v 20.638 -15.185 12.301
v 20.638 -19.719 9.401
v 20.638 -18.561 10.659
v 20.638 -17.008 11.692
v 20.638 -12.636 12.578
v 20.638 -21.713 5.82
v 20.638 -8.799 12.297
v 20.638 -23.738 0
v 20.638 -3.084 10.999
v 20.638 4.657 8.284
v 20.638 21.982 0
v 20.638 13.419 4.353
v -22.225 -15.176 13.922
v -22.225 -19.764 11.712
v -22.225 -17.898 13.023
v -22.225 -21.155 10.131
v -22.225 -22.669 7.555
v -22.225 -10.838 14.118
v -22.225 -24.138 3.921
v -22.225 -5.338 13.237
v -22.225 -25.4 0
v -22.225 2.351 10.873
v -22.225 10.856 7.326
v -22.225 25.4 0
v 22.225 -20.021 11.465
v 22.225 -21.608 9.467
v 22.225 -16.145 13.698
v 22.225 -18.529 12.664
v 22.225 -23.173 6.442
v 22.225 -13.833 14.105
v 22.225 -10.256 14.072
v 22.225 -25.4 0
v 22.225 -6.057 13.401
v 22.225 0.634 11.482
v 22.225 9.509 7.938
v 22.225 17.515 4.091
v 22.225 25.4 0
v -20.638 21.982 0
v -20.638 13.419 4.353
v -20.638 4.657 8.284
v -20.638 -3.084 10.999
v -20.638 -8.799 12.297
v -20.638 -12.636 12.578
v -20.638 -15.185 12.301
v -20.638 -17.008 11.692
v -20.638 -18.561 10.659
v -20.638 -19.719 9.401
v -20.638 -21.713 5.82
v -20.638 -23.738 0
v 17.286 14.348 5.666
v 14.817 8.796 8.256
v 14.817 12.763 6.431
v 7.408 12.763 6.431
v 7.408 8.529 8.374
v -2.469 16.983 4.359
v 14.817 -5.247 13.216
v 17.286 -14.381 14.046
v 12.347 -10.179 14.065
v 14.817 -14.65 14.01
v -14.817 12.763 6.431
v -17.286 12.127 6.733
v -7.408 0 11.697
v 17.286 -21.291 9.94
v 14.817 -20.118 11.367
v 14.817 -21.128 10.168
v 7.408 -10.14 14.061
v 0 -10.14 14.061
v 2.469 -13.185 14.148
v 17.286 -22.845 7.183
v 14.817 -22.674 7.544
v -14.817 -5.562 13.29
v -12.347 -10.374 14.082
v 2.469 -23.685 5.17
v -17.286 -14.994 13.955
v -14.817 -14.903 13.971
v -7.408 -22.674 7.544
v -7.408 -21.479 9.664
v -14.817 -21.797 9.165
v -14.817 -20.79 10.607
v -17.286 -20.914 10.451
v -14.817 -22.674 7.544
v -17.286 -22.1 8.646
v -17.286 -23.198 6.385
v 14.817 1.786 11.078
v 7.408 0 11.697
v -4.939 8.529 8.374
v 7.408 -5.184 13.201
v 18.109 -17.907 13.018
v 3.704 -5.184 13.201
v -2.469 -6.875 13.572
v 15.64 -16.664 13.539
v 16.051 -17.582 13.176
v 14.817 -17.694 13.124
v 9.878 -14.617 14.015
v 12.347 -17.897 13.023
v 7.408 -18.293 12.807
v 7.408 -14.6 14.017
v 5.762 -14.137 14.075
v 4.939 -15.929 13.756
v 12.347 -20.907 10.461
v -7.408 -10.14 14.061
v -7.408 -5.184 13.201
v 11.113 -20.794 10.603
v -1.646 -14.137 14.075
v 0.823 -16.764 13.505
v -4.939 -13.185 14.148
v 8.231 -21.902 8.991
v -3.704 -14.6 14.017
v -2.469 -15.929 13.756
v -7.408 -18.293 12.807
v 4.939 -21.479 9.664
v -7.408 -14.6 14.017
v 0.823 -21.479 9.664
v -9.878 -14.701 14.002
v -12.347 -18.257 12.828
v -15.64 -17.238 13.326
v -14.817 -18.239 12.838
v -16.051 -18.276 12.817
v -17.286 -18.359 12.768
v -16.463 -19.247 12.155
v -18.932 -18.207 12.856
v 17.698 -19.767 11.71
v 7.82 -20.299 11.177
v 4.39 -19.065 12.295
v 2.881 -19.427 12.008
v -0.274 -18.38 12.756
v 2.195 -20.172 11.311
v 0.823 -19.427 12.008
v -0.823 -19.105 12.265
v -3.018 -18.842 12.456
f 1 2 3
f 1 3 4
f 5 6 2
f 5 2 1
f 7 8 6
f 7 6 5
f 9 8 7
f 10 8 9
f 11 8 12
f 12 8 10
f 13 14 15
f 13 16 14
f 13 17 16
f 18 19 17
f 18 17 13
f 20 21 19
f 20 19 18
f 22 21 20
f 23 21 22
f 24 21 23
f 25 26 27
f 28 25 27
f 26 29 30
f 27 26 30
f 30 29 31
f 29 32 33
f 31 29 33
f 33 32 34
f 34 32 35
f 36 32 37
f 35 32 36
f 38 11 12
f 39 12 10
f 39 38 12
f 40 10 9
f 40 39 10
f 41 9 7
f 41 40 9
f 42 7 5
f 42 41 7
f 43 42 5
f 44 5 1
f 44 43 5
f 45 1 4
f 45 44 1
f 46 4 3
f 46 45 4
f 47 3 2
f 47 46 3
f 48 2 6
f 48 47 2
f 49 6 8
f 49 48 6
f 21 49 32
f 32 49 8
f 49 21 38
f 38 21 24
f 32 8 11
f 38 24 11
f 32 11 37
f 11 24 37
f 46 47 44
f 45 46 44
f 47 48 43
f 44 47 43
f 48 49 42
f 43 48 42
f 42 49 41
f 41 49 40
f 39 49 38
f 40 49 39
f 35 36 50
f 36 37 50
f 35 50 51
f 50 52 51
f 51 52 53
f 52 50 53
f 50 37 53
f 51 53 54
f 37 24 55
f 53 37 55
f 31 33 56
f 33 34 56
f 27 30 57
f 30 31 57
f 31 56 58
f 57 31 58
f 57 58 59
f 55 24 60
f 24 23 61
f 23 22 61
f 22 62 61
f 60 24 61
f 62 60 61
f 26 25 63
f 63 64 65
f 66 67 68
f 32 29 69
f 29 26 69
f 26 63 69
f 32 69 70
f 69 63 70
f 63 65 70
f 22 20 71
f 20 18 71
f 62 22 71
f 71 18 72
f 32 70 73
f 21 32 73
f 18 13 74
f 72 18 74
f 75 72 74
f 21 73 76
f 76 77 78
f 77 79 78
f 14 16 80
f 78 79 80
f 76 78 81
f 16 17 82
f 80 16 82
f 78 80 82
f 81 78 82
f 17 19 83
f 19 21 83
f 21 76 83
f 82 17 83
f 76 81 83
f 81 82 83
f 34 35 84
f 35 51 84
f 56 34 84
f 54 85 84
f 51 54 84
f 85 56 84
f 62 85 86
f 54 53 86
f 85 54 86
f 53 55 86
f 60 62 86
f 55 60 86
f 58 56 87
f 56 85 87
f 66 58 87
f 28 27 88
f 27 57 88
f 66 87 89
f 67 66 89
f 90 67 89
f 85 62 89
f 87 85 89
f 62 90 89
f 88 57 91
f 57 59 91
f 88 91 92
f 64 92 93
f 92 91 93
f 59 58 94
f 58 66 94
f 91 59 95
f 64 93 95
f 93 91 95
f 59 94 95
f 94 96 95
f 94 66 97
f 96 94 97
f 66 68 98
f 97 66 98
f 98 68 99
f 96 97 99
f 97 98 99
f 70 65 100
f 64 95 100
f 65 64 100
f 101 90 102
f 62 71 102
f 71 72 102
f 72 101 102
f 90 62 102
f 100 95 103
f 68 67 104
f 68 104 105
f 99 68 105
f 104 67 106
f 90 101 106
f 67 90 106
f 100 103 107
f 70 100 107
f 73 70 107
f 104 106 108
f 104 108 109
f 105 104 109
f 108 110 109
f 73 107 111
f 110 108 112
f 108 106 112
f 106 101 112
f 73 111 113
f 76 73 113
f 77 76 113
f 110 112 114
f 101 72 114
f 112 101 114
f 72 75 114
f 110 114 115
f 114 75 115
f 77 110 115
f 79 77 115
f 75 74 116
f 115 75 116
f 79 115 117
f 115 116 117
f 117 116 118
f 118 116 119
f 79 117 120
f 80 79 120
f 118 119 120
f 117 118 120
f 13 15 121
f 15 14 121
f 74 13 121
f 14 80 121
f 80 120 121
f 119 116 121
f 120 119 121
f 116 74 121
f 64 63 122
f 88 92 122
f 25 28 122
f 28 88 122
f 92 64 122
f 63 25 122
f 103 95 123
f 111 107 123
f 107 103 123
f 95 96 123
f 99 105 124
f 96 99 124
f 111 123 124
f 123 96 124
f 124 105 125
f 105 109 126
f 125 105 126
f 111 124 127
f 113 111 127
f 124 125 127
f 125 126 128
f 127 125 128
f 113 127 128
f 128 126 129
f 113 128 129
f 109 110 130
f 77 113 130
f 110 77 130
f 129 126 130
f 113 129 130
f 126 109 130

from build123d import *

# Parameters (mm, degrees)
F0_W     = 44.45
F0_H     = 50.8
F1_DEPTH = 19.05
F3_DEPTH = 44.451
F4_T     = -1.5875


with BuildPart() as f1:
    # F0 (on Top) → F1 (new body)
    with BuildSketch(Plane.XY):
        Rectangle(F0_W, F0_H)
    extrude(amount=F1_DEPTH)

    # F2 (on face) → F3 (cut, through all)
    with BuildSketch(Plane(origin=(-22.225, 0, 0), x_dir=(0, -1, 0), z_dir=(-1, 0, 0))):
        with BuildLine():
            Line((-25.4, 19.05), (-25.4, 0))
            add(Edge.make_bspline(
                [(-25.4, 0), (-16.9891224495, 4.4170263021), (-1.7691594232, 12.4098875227), (20.3051132663, 16.4752051875), (23.7662970219, 5.2828636212), (25.4, 0)],
                knots=[0, 0, 0, 0, 0.3947463386, 0.714316032, 1, 1, 1, 1], degree=3))
            Line((25.4, 0), (25.4, 19.05))
            Line((25.4, 19.05), (-25.4, 19.05))
        make_face()
    extrude(amount=-F3_DEPTH, mode=Mode.SUBTRACT)

    # F4
    f4_openings = [f1.faces().sort_by_distance(p)[0] for p in [
        (0, 0, 0),
    ]]
    offset(amount=F4_T, openings=f4_openings)


solid = f1.part
